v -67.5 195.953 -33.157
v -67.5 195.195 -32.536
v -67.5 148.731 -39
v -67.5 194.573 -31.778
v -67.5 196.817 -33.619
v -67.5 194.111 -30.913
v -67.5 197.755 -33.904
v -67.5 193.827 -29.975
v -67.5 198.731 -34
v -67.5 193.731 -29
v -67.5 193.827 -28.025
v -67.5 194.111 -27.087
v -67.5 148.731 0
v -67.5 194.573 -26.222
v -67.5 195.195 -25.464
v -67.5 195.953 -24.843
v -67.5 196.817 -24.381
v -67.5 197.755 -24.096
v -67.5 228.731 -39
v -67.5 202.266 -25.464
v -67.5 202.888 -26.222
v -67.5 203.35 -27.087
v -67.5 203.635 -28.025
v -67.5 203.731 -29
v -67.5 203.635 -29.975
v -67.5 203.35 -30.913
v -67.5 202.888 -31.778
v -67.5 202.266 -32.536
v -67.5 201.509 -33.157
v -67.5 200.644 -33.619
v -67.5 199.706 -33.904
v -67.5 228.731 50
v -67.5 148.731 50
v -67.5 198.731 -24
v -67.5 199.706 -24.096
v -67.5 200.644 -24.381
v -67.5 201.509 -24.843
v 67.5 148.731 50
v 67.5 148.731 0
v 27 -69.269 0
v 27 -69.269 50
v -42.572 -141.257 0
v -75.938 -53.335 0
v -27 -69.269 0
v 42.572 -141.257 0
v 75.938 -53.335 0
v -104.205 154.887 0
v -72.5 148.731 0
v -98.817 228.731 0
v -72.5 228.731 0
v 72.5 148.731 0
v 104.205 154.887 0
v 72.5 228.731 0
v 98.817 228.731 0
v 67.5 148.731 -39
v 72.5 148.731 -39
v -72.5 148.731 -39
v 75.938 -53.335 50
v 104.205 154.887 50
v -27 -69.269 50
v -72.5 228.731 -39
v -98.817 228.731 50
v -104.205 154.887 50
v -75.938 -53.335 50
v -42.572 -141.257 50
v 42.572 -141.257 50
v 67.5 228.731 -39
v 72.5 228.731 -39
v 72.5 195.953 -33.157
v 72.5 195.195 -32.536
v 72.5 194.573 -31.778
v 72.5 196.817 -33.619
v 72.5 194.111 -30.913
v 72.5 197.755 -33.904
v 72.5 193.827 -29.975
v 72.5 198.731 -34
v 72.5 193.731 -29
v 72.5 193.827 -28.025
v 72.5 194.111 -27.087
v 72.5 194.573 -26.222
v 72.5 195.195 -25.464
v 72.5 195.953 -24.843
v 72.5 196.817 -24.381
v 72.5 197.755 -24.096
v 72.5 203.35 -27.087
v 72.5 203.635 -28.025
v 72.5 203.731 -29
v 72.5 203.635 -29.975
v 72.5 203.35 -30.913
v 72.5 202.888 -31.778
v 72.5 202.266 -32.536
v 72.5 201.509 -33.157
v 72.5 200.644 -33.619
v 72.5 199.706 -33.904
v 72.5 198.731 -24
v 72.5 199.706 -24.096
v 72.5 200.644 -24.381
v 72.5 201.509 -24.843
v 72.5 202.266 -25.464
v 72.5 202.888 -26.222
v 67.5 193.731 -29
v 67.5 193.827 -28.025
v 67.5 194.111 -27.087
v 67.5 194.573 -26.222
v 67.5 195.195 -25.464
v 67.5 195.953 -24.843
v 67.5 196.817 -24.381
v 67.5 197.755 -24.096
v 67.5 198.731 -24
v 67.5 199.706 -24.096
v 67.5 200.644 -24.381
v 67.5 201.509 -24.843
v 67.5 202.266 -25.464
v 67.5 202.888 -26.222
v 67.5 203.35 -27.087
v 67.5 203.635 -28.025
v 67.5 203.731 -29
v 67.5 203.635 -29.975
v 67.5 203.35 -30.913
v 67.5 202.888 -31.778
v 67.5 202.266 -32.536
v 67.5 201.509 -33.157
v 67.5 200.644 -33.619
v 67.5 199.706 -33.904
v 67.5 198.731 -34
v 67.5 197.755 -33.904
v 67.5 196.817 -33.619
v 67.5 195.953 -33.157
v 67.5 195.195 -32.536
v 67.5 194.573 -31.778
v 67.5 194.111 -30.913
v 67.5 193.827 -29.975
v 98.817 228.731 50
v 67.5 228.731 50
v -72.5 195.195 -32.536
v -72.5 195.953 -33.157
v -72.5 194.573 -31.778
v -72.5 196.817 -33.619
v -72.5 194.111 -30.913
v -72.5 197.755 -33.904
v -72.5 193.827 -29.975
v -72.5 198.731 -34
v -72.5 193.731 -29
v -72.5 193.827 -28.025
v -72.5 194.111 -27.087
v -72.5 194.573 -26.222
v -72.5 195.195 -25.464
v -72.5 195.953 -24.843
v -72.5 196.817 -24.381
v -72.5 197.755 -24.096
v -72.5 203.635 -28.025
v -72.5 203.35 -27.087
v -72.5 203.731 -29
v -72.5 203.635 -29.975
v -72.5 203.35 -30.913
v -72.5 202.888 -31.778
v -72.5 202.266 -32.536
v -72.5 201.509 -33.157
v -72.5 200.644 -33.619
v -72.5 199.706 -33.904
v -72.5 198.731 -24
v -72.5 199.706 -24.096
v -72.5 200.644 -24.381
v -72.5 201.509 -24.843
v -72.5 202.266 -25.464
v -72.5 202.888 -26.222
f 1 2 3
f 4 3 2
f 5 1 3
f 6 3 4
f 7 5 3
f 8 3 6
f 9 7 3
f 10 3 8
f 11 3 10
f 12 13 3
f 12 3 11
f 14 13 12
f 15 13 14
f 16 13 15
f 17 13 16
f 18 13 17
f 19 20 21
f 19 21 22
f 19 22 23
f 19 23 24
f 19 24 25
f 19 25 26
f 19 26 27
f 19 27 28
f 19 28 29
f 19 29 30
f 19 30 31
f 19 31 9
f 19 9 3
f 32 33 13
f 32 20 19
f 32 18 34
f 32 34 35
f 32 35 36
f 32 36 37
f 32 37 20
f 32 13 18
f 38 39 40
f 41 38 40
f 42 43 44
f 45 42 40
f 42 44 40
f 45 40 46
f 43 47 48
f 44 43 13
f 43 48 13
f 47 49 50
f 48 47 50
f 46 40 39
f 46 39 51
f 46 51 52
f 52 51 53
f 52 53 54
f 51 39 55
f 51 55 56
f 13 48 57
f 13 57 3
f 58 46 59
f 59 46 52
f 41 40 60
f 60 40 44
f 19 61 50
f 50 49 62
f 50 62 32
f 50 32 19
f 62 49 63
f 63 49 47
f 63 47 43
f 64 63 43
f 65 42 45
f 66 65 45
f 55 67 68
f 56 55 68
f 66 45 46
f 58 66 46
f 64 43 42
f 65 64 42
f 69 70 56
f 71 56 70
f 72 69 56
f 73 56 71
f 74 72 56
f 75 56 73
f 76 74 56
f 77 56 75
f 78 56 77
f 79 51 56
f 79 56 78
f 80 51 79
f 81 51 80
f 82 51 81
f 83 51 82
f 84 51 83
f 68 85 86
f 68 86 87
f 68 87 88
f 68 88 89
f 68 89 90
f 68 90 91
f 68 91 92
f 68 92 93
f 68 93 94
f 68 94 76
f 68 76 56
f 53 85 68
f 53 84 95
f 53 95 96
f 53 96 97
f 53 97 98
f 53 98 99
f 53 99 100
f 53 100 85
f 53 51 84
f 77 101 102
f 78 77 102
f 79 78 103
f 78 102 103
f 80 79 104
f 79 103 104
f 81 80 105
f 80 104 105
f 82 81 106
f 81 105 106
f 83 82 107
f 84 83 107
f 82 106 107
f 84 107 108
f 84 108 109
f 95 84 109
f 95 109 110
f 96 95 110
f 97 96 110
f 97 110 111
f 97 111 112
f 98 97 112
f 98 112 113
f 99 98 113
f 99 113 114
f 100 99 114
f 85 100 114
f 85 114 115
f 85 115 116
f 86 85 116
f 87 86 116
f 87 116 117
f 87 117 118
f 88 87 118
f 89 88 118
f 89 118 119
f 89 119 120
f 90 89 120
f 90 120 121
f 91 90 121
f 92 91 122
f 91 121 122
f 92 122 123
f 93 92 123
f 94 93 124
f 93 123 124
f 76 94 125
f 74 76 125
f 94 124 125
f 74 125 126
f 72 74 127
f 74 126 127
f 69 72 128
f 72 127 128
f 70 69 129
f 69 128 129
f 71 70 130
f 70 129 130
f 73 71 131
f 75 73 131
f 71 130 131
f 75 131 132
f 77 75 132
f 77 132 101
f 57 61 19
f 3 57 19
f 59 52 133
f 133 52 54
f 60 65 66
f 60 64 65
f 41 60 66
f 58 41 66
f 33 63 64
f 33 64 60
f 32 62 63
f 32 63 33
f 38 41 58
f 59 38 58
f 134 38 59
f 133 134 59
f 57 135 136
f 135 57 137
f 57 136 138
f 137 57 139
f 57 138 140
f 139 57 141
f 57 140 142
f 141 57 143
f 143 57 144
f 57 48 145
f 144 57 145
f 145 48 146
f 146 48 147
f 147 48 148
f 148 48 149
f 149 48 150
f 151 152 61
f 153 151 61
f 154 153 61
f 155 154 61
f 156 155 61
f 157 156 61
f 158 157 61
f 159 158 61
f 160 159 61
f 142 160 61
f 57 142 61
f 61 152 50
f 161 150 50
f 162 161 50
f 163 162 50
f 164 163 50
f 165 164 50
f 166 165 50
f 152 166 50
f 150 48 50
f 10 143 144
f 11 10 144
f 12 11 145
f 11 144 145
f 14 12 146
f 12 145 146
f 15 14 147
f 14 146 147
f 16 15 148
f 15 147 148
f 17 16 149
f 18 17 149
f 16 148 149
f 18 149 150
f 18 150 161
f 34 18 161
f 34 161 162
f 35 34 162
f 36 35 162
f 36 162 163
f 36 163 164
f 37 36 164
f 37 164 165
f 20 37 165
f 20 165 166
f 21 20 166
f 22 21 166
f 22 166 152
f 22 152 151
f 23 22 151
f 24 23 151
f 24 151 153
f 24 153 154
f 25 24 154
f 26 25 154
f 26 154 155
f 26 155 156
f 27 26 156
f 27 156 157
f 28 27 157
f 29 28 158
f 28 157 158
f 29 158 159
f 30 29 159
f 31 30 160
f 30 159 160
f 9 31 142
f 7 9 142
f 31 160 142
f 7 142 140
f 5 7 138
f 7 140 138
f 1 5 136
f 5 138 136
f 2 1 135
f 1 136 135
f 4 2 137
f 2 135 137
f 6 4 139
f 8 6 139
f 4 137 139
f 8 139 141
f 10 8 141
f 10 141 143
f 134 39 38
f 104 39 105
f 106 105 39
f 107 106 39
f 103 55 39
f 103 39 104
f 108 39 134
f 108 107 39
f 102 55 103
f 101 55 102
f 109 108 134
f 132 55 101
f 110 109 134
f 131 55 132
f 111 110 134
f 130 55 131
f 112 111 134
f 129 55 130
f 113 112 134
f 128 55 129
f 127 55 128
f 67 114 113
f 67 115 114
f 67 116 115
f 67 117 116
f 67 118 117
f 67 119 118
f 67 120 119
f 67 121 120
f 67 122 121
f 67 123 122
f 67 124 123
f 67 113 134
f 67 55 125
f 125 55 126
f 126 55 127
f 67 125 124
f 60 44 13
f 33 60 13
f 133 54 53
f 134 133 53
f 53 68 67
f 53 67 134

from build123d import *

# Parameters (mm, degrees)
F0_W     = 5
F0_H     = 80
F1_DEPTH = 50
F2_DEPTH = 39
F4_D     = 10


with BuildPart() as f1:
    # F0 (on Top) → F1 (new body)
    with BuildSketch(Plane.XY):
        Polygon((-42.571511, -141.256928), (0, -141.256928), (42.571511, -141.256928), (75.937726, -53.33484), (104.205489, 154.886812), (98.816866, 228.730714), (72.5, 228.730714), (72.5, 148.730714), (67.5, 148.730714), (27, -69.269286), (0, -69.269286), (-27, -69.269286), (-67.5, 148.730714), (-72.5, 148.730714), (-72.5, 228.730714), (-98.816866, 228.730714), (-104.205489, 154.886812), (-75.937726, -53.33484), align=None)
        with Locations((70, 188.730714)):
            Rectangle(F0_W, F0_H)
        with Locations((-70, 188.730714)):
            Rectangle(F0_W, F0_H)
    extrude(amount=F1_DEPTH)

    # F0 (on Top) → F2 (join)
    with BuildSketch(Plane.XY):
        with Locations((-70, 188.730714)):
            Rectangle(F0_W, F0_H)
        with Locations((70, 188.730714)):
            Rectangle(F0_W, F0_H)
    extrude(amount=-F2_DEPTH)

    # F4 (through all)
    with Locations(Plane.YZ.offset(72.5)):
        with Locations((198.730714, -29)):
            Hole(F4_D / 2)


solid = f1.part
